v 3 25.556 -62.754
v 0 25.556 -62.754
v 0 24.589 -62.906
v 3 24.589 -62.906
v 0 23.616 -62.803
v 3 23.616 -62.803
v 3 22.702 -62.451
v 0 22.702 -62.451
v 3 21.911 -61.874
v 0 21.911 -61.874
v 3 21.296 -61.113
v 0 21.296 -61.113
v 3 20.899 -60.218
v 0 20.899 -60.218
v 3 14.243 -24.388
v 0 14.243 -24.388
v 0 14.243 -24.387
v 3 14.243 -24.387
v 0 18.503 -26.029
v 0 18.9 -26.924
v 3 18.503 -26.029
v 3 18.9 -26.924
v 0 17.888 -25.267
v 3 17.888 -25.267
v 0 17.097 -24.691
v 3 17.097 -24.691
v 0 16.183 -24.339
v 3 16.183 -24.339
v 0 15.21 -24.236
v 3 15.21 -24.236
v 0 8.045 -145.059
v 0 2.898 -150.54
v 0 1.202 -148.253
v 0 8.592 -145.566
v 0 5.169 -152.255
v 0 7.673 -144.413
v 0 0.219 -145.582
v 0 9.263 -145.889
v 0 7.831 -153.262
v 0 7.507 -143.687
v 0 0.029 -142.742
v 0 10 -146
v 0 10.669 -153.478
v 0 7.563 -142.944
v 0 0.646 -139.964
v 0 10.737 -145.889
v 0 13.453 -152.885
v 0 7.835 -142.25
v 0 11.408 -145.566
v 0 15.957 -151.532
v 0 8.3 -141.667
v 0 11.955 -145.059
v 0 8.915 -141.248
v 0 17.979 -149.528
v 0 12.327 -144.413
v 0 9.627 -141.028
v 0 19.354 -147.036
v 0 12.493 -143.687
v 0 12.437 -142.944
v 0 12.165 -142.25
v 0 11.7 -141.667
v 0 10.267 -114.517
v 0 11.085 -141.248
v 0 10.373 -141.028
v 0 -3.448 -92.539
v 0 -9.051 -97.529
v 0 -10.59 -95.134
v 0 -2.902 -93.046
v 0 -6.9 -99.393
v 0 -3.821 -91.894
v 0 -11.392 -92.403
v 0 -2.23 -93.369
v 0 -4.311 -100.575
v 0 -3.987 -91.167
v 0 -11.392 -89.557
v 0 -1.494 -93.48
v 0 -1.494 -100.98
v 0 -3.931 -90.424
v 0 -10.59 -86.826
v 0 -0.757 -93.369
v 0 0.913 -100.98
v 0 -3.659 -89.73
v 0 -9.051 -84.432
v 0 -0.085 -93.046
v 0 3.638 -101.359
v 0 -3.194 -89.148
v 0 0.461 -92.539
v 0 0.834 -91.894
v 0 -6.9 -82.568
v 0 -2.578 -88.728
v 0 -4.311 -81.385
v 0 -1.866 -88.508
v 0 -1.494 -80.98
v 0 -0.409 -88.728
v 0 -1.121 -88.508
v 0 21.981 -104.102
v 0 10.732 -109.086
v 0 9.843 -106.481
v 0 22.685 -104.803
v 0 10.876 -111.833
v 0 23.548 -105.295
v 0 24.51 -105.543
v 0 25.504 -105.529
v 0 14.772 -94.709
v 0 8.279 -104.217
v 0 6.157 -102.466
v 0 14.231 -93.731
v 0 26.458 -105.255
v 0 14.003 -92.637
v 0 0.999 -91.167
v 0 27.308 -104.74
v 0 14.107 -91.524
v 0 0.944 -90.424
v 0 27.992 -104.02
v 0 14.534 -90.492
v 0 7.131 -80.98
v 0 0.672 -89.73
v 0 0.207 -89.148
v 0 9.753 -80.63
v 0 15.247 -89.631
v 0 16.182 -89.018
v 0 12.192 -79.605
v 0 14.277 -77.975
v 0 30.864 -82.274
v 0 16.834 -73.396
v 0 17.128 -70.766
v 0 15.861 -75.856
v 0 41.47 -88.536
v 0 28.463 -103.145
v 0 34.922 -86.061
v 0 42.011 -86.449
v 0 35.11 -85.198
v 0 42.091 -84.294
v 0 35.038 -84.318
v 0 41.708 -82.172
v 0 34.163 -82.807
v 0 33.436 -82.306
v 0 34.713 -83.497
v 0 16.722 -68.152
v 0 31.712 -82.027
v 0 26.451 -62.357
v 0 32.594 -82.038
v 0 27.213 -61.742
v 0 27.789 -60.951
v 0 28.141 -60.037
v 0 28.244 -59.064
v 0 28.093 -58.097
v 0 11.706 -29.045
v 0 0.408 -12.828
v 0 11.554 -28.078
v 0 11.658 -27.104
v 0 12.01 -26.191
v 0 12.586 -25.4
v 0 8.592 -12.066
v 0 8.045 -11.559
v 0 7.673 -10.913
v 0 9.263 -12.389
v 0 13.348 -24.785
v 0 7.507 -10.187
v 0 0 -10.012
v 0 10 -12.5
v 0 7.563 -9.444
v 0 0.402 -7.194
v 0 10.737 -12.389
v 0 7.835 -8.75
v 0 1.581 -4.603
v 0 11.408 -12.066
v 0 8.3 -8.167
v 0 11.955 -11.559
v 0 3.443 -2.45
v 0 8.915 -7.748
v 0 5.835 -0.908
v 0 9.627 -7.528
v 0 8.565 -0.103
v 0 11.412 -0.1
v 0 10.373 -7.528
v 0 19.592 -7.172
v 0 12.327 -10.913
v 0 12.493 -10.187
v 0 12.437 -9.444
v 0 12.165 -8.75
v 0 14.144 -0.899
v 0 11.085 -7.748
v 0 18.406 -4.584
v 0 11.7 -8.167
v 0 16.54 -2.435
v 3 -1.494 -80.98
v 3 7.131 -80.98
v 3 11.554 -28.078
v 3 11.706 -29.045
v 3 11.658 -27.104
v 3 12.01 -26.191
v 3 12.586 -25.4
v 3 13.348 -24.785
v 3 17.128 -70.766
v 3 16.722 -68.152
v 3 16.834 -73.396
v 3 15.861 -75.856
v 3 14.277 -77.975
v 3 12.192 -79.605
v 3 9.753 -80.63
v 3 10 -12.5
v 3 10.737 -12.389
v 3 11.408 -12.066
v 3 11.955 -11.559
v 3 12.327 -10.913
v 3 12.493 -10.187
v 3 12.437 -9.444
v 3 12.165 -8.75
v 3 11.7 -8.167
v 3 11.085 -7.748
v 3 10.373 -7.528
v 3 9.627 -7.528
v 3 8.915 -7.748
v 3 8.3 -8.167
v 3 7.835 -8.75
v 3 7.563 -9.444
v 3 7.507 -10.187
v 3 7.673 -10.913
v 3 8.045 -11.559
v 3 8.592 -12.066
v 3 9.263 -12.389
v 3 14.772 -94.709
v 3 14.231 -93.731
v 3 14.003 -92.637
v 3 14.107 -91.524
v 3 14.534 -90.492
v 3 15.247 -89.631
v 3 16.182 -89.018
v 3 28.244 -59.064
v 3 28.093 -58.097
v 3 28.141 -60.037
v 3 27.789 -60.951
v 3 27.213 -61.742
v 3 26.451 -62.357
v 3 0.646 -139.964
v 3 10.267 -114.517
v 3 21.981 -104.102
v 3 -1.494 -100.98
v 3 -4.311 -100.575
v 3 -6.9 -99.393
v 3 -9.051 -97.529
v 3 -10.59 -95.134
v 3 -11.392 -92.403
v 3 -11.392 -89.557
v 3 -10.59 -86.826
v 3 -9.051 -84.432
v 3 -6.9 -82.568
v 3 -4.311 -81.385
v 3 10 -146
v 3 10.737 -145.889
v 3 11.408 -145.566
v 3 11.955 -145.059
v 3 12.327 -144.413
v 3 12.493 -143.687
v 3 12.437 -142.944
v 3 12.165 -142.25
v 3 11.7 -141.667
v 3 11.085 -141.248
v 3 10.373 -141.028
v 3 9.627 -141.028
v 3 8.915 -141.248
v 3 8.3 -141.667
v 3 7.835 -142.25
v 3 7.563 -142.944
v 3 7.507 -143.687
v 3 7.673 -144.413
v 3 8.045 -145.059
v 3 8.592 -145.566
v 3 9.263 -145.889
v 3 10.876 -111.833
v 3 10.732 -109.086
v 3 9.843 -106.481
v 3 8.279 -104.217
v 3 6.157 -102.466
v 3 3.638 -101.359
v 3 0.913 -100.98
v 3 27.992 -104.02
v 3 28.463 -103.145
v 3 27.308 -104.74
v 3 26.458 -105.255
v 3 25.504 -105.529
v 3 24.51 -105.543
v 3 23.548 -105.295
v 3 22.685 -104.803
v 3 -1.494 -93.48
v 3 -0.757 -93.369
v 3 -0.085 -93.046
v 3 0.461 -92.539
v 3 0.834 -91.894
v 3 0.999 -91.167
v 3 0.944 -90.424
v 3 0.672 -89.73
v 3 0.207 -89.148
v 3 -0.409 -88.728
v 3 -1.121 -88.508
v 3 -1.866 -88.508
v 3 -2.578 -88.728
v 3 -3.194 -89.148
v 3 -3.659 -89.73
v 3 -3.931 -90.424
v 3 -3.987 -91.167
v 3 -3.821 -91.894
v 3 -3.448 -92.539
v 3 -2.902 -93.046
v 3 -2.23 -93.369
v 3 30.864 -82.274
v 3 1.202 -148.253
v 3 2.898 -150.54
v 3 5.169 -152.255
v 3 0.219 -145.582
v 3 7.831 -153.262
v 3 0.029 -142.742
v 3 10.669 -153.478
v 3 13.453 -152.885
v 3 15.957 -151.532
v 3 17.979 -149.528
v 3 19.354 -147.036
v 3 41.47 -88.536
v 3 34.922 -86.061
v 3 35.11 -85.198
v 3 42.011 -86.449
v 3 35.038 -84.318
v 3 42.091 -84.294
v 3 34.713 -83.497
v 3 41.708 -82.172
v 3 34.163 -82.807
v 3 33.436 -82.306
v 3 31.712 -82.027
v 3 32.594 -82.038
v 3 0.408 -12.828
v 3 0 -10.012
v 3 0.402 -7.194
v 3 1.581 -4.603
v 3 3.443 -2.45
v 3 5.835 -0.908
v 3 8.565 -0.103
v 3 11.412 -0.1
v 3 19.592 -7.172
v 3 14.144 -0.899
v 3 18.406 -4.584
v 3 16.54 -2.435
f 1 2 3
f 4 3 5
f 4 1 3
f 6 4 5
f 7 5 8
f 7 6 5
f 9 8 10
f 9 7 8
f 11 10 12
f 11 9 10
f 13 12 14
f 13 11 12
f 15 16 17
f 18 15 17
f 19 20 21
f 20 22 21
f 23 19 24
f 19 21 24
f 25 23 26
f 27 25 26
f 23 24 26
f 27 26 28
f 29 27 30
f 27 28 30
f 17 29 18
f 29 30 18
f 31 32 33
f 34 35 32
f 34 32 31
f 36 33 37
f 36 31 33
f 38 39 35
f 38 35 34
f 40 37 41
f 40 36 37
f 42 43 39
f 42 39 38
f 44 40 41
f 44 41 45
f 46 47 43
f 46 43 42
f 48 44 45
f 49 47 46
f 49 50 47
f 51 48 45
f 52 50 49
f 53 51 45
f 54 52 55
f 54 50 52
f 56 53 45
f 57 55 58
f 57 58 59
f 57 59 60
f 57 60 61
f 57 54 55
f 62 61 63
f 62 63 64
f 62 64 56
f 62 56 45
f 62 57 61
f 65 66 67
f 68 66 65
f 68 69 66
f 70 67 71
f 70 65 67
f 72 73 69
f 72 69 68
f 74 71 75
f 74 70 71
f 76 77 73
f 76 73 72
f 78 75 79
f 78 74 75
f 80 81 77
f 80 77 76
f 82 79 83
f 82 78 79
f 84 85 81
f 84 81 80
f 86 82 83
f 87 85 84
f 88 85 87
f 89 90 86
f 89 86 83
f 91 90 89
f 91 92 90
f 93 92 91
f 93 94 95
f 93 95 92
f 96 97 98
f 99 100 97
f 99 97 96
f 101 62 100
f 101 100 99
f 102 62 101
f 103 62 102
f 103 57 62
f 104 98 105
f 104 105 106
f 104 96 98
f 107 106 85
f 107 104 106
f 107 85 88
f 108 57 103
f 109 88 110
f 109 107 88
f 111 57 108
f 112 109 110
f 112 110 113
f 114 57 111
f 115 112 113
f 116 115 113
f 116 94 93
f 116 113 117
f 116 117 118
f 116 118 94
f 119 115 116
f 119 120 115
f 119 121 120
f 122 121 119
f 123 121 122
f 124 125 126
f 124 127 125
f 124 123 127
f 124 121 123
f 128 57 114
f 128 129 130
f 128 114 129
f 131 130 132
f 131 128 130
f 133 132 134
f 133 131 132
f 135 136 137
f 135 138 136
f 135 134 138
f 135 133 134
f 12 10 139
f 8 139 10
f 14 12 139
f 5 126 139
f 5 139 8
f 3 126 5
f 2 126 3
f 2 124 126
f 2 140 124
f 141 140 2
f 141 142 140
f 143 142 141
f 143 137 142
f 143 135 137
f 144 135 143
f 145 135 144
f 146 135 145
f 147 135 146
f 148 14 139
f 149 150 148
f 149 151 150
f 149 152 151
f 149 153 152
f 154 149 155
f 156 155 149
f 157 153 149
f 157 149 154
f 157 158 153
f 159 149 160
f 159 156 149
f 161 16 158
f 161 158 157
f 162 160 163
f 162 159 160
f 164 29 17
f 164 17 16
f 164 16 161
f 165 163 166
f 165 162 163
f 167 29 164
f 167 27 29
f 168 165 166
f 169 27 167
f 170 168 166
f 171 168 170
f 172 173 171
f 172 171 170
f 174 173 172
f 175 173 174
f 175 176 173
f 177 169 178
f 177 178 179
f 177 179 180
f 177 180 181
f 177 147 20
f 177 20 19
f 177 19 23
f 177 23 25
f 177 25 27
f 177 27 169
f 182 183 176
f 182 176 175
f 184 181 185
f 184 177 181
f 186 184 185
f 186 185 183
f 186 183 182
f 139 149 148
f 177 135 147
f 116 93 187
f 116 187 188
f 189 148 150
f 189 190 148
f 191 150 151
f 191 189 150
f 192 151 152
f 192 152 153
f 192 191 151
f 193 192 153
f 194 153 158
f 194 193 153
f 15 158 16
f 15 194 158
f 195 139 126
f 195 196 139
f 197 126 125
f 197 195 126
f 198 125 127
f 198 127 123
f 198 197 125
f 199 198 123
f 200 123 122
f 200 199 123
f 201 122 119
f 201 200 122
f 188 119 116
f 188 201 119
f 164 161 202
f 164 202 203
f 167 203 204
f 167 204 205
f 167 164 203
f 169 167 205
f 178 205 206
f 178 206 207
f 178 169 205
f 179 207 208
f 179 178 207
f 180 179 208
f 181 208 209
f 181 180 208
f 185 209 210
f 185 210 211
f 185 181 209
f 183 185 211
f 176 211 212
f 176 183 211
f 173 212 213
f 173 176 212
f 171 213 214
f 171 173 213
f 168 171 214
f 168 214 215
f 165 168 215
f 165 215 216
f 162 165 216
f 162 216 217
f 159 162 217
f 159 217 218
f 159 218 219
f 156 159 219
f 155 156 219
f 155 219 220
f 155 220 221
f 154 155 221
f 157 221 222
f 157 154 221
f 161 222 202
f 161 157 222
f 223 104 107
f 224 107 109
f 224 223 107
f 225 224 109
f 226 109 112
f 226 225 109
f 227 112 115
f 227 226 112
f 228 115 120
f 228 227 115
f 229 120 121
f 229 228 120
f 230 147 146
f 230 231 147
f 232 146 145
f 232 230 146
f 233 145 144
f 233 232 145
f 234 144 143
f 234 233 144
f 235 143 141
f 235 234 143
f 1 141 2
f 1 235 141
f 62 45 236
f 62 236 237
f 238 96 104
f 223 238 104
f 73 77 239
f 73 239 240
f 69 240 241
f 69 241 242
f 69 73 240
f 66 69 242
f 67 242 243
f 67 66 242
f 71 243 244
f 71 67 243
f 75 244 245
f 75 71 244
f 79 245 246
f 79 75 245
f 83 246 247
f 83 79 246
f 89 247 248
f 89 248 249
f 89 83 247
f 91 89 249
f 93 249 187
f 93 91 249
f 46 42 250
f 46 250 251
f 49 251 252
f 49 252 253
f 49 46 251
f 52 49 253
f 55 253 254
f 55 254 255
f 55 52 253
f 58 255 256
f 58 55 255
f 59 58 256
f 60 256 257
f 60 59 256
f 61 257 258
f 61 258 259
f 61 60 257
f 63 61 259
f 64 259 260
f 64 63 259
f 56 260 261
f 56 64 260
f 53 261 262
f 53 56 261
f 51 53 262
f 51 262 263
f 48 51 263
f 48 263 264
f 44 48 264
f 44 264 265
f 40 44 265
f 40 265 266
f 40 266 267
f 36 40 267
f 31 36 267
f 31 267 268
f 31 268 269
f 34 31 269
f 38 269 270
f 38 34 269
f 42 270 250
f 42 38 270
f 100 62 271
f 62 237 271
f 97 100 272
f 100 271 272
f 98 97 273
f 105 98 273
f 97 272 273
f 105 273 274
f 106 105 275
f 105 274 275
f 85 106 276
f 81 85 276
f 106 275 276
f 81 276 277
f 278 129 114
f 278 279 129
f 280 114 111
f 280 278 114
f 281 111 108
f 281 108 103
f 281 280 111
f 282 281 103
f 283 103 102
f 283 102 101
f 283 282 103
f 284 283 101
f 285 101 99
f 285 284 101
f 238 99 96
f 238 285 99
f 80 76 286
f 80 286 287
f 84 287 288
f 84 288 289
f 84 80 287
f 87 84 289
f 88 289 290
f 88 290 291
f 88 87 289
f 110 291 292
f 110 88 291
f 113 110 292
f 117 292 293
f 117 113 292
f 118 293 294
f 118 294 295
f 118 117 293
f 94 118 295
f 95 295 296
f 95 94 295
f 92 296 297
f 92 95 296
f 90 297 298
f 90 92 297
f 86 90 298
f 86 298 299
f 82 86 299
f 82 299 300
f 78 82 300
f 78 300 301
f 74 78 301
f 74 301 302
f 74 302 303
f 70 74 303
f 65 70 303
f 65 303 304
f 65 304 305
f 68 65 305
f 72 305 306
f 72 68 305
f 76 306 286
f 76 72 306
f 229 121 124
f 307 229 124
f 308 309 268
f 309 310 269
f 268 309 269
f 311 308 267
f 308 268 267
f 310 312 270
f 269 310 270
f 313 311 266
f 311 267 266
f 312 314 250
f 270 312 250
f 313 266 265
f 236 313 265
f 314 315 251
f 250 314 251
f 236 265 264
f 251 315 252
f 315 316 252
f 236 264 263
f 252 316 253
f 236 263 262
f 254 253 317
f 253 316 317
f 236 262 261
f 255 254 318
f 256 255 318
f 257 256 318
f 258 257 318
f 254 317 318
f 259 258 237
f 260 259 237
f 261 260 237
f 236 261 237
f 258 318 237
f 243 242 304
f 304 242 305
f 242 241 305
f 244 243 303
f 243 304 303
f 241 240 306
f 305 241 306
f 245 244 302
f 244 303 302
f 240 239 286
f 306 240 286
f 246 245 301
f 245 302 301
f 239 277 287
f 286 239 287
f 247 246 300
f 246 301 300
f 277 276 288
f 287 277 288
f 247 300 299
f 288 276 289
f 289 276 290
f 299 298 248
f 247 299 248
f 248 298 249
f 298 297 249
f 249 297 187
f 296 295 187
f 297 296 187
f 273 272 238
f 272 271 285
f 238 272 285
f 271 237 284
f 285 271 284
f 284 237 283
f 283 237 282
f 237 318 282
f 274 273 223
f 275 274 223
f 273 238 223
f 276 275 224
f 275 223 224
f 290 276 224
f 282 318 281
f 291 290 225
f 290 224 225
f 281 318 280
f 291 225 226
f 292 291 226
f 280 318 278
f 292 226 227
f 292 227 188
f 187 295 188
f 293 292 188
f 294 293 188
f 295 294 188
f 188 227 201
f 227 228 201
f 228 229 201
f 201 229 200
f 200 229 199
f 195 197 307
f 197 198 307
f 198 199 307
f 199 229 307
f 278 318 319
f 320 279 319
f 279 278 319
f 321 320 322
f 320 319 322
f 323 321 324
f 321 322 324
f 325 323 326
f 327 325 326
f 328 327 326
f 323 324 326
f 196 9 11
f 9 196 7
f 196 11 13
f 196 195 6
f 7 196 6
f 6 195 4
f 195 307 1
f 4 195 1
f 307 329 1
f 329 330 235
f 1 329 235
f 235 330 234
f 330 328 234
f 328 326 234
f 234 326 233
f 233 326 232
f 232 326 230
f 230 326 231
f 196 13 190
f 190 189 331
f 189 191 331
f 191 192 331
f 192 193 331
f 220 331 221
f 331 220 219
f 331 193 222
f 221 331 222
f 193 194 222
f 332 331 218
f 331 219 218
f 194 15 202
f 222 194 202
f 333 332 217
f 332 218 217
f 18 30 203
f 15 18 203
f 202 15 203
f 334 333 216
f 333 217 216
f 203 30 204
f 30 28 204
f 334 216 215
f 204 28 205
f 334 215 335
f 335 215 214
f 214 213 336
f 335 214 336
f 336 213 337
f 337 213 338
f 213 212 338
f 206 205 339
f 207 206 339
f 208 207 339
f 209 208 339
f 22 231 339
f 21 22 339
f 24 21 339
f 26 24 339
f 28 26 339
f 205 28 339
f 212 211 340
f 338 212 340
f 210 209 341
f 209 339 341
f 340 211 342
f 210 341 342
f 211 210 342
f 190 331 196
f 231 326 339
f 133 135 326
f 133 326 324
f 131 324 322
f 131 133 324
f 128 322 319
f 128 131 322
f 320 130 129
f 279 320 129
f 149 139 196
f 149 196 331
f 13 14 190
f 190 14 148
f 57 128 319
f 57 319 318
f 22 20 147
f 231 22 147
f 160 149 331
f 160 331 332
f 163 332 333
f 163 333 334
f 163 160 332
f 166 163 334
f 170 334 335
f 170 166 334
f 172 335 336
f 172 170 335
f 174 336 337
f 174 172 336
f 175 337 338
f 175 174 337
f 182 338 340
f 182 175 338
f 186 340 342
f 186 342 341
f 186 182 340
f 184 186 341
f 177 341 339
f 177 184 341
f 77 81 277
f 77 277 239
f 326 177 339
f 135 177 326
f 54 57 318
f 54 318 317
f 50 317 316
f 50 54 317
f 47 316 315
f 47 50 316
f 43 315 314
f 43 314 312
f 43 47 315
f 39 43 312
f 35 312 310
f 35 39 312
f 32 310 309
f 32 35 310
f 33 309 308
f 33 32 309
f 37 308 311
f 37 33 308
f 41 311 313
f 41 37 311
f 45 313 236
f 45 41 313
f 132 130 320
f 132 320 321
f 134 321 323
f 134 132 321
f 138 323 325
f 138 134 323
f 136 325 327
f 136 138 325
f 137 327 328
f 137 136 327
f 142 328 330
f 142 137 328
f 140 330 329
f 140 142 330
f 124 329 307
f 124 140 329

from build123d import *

# Parameters (mm, degrees)
SKETCH3_R           = 3
SKETCH3_R_2         = 2.5
BOSS_EXTRUDE2_DEPTH = 3
FILLET1_R           = 10
CUT_EXTRUDE1_DEPTH  = 10
FILLET2_R           = 3.75


with BuildPart() as part:
    # Sketch3 → Boss-Extrude2 (new body)
    with BuildSketch(Plane(origin=(0, 0, 0), x_dir=(0, 0, -1), z_dir=(1, 0, 0))):
        with BuildLine():
            Line((7.171582169, 19.591665787), (82.171582169, 41.707880218))
            ThreePointArc((82.171582169, 41.707880218), (85.373366716, 42.109241865), (88.536274395, 41.470077986))
            Line((88.536274395, 41.470077986), (147.036274395, 19.353863555))
            ThreePointArc((147.036274395, 19.353863555), (152.853863555, 6.463725605), (139.963725605, 0.646136445))
            Line((139.963725605, 0.646136445), (100.980229255, 15.384040113))
            Line((100.980229255, 15.384040113), (100.980229255, -1.493532665))
            ThreePointArc((100.980229255, -1.493532665), (90.980229255, -11.493532665), (80.980229255, -1.493532665))
            Line((80.980229255, -1.493532665), (80.980229255, 20.505135217))
            Line((80.980229255, 20.505135217), (12.828417831, 0.408334213))
            ThreePointArc((12.828417831, 0.408334213), (0.408334213, 7.171582169), (7.171582169, 19.591665787))
        make_face()
        with Locations((85, 32.116214431)):
            Circle(SKETCH3_R, mode=Mode.SUBTRACT)
        with Locations((90.980229255, -1.493532665)):
            Circle(SKETCH3_R_2, mode=Mode.SUBTRACT)
        with Locations((10, 10)):
            Circle(SKETCH3_R_2, mode=Mode.SUBTRACT)
        with Locations((143.5, 10)):
            Circle(SKETCH3_R_2, mode=Mode.SUBTRACT)
    extrude(amount=BOSS_EXTRUDE2_DEPTH)

    # Fillet1
    fillet1_edges = [part.edges().sort_by_distance(p)[0] for p in [
        (1.5, 20.505135217, -80.980229255),
        (1.5, 15.384040113, -100.980229255),
    ]]
    fillet(fillet1_edges, radius=FILLET1_R)

    # Sketch5 → Cut-Extrude1 (cut)
    with BuildSketch(Plane(origin=(0, 0, 0), x_dir=(0, 0, -1), z_dir=(1, 0, 0))):
        Polygon((23.326841994, 17.839501416), (61.693505144, 29.153172739), (63.814818517, 21.959423399), (25.448155367, 10.645752076), align=None)
        with BuildLine():
            Line((86.060882319, 34.922373497), (109.445541205, 26.081687509))
            Line((109.445541205, 26.081687509), (90.980229255, 11.910433147))
            Line((90.980229255, 11.910433147), (82.273860108, 30.863951963))
            ThreePointArc((82.273860108, 30.863951963), (82.806608326, 34.162927153), (86.060882319, 34.922373497))
        make_face()
    extrude(amount=CUT_EXTRUDE1_DEPTH, mode=Mode.SUBTRACT)

    # Fillet2
    fillet2_edges = [part.edges().sort_by_distance(p)[0] for p in [
        (1.5, 11.910433147, -90.980229255),
        (1.5, 26.081687509, -109.445541205),
        (1.5, 29.153172739, -61.693505144),
        (1.5, 21.959423399, -63.814818517),
        (1.5, 10.645752076, -25.448155367),
        (1.5, 17.839501416, -23.326841994),
    ]]
    fillet(fillet2_edges, radius=FILLET2_R - 0.0001)  # a hair under: the kernel refuses the full size


solid = part.part
